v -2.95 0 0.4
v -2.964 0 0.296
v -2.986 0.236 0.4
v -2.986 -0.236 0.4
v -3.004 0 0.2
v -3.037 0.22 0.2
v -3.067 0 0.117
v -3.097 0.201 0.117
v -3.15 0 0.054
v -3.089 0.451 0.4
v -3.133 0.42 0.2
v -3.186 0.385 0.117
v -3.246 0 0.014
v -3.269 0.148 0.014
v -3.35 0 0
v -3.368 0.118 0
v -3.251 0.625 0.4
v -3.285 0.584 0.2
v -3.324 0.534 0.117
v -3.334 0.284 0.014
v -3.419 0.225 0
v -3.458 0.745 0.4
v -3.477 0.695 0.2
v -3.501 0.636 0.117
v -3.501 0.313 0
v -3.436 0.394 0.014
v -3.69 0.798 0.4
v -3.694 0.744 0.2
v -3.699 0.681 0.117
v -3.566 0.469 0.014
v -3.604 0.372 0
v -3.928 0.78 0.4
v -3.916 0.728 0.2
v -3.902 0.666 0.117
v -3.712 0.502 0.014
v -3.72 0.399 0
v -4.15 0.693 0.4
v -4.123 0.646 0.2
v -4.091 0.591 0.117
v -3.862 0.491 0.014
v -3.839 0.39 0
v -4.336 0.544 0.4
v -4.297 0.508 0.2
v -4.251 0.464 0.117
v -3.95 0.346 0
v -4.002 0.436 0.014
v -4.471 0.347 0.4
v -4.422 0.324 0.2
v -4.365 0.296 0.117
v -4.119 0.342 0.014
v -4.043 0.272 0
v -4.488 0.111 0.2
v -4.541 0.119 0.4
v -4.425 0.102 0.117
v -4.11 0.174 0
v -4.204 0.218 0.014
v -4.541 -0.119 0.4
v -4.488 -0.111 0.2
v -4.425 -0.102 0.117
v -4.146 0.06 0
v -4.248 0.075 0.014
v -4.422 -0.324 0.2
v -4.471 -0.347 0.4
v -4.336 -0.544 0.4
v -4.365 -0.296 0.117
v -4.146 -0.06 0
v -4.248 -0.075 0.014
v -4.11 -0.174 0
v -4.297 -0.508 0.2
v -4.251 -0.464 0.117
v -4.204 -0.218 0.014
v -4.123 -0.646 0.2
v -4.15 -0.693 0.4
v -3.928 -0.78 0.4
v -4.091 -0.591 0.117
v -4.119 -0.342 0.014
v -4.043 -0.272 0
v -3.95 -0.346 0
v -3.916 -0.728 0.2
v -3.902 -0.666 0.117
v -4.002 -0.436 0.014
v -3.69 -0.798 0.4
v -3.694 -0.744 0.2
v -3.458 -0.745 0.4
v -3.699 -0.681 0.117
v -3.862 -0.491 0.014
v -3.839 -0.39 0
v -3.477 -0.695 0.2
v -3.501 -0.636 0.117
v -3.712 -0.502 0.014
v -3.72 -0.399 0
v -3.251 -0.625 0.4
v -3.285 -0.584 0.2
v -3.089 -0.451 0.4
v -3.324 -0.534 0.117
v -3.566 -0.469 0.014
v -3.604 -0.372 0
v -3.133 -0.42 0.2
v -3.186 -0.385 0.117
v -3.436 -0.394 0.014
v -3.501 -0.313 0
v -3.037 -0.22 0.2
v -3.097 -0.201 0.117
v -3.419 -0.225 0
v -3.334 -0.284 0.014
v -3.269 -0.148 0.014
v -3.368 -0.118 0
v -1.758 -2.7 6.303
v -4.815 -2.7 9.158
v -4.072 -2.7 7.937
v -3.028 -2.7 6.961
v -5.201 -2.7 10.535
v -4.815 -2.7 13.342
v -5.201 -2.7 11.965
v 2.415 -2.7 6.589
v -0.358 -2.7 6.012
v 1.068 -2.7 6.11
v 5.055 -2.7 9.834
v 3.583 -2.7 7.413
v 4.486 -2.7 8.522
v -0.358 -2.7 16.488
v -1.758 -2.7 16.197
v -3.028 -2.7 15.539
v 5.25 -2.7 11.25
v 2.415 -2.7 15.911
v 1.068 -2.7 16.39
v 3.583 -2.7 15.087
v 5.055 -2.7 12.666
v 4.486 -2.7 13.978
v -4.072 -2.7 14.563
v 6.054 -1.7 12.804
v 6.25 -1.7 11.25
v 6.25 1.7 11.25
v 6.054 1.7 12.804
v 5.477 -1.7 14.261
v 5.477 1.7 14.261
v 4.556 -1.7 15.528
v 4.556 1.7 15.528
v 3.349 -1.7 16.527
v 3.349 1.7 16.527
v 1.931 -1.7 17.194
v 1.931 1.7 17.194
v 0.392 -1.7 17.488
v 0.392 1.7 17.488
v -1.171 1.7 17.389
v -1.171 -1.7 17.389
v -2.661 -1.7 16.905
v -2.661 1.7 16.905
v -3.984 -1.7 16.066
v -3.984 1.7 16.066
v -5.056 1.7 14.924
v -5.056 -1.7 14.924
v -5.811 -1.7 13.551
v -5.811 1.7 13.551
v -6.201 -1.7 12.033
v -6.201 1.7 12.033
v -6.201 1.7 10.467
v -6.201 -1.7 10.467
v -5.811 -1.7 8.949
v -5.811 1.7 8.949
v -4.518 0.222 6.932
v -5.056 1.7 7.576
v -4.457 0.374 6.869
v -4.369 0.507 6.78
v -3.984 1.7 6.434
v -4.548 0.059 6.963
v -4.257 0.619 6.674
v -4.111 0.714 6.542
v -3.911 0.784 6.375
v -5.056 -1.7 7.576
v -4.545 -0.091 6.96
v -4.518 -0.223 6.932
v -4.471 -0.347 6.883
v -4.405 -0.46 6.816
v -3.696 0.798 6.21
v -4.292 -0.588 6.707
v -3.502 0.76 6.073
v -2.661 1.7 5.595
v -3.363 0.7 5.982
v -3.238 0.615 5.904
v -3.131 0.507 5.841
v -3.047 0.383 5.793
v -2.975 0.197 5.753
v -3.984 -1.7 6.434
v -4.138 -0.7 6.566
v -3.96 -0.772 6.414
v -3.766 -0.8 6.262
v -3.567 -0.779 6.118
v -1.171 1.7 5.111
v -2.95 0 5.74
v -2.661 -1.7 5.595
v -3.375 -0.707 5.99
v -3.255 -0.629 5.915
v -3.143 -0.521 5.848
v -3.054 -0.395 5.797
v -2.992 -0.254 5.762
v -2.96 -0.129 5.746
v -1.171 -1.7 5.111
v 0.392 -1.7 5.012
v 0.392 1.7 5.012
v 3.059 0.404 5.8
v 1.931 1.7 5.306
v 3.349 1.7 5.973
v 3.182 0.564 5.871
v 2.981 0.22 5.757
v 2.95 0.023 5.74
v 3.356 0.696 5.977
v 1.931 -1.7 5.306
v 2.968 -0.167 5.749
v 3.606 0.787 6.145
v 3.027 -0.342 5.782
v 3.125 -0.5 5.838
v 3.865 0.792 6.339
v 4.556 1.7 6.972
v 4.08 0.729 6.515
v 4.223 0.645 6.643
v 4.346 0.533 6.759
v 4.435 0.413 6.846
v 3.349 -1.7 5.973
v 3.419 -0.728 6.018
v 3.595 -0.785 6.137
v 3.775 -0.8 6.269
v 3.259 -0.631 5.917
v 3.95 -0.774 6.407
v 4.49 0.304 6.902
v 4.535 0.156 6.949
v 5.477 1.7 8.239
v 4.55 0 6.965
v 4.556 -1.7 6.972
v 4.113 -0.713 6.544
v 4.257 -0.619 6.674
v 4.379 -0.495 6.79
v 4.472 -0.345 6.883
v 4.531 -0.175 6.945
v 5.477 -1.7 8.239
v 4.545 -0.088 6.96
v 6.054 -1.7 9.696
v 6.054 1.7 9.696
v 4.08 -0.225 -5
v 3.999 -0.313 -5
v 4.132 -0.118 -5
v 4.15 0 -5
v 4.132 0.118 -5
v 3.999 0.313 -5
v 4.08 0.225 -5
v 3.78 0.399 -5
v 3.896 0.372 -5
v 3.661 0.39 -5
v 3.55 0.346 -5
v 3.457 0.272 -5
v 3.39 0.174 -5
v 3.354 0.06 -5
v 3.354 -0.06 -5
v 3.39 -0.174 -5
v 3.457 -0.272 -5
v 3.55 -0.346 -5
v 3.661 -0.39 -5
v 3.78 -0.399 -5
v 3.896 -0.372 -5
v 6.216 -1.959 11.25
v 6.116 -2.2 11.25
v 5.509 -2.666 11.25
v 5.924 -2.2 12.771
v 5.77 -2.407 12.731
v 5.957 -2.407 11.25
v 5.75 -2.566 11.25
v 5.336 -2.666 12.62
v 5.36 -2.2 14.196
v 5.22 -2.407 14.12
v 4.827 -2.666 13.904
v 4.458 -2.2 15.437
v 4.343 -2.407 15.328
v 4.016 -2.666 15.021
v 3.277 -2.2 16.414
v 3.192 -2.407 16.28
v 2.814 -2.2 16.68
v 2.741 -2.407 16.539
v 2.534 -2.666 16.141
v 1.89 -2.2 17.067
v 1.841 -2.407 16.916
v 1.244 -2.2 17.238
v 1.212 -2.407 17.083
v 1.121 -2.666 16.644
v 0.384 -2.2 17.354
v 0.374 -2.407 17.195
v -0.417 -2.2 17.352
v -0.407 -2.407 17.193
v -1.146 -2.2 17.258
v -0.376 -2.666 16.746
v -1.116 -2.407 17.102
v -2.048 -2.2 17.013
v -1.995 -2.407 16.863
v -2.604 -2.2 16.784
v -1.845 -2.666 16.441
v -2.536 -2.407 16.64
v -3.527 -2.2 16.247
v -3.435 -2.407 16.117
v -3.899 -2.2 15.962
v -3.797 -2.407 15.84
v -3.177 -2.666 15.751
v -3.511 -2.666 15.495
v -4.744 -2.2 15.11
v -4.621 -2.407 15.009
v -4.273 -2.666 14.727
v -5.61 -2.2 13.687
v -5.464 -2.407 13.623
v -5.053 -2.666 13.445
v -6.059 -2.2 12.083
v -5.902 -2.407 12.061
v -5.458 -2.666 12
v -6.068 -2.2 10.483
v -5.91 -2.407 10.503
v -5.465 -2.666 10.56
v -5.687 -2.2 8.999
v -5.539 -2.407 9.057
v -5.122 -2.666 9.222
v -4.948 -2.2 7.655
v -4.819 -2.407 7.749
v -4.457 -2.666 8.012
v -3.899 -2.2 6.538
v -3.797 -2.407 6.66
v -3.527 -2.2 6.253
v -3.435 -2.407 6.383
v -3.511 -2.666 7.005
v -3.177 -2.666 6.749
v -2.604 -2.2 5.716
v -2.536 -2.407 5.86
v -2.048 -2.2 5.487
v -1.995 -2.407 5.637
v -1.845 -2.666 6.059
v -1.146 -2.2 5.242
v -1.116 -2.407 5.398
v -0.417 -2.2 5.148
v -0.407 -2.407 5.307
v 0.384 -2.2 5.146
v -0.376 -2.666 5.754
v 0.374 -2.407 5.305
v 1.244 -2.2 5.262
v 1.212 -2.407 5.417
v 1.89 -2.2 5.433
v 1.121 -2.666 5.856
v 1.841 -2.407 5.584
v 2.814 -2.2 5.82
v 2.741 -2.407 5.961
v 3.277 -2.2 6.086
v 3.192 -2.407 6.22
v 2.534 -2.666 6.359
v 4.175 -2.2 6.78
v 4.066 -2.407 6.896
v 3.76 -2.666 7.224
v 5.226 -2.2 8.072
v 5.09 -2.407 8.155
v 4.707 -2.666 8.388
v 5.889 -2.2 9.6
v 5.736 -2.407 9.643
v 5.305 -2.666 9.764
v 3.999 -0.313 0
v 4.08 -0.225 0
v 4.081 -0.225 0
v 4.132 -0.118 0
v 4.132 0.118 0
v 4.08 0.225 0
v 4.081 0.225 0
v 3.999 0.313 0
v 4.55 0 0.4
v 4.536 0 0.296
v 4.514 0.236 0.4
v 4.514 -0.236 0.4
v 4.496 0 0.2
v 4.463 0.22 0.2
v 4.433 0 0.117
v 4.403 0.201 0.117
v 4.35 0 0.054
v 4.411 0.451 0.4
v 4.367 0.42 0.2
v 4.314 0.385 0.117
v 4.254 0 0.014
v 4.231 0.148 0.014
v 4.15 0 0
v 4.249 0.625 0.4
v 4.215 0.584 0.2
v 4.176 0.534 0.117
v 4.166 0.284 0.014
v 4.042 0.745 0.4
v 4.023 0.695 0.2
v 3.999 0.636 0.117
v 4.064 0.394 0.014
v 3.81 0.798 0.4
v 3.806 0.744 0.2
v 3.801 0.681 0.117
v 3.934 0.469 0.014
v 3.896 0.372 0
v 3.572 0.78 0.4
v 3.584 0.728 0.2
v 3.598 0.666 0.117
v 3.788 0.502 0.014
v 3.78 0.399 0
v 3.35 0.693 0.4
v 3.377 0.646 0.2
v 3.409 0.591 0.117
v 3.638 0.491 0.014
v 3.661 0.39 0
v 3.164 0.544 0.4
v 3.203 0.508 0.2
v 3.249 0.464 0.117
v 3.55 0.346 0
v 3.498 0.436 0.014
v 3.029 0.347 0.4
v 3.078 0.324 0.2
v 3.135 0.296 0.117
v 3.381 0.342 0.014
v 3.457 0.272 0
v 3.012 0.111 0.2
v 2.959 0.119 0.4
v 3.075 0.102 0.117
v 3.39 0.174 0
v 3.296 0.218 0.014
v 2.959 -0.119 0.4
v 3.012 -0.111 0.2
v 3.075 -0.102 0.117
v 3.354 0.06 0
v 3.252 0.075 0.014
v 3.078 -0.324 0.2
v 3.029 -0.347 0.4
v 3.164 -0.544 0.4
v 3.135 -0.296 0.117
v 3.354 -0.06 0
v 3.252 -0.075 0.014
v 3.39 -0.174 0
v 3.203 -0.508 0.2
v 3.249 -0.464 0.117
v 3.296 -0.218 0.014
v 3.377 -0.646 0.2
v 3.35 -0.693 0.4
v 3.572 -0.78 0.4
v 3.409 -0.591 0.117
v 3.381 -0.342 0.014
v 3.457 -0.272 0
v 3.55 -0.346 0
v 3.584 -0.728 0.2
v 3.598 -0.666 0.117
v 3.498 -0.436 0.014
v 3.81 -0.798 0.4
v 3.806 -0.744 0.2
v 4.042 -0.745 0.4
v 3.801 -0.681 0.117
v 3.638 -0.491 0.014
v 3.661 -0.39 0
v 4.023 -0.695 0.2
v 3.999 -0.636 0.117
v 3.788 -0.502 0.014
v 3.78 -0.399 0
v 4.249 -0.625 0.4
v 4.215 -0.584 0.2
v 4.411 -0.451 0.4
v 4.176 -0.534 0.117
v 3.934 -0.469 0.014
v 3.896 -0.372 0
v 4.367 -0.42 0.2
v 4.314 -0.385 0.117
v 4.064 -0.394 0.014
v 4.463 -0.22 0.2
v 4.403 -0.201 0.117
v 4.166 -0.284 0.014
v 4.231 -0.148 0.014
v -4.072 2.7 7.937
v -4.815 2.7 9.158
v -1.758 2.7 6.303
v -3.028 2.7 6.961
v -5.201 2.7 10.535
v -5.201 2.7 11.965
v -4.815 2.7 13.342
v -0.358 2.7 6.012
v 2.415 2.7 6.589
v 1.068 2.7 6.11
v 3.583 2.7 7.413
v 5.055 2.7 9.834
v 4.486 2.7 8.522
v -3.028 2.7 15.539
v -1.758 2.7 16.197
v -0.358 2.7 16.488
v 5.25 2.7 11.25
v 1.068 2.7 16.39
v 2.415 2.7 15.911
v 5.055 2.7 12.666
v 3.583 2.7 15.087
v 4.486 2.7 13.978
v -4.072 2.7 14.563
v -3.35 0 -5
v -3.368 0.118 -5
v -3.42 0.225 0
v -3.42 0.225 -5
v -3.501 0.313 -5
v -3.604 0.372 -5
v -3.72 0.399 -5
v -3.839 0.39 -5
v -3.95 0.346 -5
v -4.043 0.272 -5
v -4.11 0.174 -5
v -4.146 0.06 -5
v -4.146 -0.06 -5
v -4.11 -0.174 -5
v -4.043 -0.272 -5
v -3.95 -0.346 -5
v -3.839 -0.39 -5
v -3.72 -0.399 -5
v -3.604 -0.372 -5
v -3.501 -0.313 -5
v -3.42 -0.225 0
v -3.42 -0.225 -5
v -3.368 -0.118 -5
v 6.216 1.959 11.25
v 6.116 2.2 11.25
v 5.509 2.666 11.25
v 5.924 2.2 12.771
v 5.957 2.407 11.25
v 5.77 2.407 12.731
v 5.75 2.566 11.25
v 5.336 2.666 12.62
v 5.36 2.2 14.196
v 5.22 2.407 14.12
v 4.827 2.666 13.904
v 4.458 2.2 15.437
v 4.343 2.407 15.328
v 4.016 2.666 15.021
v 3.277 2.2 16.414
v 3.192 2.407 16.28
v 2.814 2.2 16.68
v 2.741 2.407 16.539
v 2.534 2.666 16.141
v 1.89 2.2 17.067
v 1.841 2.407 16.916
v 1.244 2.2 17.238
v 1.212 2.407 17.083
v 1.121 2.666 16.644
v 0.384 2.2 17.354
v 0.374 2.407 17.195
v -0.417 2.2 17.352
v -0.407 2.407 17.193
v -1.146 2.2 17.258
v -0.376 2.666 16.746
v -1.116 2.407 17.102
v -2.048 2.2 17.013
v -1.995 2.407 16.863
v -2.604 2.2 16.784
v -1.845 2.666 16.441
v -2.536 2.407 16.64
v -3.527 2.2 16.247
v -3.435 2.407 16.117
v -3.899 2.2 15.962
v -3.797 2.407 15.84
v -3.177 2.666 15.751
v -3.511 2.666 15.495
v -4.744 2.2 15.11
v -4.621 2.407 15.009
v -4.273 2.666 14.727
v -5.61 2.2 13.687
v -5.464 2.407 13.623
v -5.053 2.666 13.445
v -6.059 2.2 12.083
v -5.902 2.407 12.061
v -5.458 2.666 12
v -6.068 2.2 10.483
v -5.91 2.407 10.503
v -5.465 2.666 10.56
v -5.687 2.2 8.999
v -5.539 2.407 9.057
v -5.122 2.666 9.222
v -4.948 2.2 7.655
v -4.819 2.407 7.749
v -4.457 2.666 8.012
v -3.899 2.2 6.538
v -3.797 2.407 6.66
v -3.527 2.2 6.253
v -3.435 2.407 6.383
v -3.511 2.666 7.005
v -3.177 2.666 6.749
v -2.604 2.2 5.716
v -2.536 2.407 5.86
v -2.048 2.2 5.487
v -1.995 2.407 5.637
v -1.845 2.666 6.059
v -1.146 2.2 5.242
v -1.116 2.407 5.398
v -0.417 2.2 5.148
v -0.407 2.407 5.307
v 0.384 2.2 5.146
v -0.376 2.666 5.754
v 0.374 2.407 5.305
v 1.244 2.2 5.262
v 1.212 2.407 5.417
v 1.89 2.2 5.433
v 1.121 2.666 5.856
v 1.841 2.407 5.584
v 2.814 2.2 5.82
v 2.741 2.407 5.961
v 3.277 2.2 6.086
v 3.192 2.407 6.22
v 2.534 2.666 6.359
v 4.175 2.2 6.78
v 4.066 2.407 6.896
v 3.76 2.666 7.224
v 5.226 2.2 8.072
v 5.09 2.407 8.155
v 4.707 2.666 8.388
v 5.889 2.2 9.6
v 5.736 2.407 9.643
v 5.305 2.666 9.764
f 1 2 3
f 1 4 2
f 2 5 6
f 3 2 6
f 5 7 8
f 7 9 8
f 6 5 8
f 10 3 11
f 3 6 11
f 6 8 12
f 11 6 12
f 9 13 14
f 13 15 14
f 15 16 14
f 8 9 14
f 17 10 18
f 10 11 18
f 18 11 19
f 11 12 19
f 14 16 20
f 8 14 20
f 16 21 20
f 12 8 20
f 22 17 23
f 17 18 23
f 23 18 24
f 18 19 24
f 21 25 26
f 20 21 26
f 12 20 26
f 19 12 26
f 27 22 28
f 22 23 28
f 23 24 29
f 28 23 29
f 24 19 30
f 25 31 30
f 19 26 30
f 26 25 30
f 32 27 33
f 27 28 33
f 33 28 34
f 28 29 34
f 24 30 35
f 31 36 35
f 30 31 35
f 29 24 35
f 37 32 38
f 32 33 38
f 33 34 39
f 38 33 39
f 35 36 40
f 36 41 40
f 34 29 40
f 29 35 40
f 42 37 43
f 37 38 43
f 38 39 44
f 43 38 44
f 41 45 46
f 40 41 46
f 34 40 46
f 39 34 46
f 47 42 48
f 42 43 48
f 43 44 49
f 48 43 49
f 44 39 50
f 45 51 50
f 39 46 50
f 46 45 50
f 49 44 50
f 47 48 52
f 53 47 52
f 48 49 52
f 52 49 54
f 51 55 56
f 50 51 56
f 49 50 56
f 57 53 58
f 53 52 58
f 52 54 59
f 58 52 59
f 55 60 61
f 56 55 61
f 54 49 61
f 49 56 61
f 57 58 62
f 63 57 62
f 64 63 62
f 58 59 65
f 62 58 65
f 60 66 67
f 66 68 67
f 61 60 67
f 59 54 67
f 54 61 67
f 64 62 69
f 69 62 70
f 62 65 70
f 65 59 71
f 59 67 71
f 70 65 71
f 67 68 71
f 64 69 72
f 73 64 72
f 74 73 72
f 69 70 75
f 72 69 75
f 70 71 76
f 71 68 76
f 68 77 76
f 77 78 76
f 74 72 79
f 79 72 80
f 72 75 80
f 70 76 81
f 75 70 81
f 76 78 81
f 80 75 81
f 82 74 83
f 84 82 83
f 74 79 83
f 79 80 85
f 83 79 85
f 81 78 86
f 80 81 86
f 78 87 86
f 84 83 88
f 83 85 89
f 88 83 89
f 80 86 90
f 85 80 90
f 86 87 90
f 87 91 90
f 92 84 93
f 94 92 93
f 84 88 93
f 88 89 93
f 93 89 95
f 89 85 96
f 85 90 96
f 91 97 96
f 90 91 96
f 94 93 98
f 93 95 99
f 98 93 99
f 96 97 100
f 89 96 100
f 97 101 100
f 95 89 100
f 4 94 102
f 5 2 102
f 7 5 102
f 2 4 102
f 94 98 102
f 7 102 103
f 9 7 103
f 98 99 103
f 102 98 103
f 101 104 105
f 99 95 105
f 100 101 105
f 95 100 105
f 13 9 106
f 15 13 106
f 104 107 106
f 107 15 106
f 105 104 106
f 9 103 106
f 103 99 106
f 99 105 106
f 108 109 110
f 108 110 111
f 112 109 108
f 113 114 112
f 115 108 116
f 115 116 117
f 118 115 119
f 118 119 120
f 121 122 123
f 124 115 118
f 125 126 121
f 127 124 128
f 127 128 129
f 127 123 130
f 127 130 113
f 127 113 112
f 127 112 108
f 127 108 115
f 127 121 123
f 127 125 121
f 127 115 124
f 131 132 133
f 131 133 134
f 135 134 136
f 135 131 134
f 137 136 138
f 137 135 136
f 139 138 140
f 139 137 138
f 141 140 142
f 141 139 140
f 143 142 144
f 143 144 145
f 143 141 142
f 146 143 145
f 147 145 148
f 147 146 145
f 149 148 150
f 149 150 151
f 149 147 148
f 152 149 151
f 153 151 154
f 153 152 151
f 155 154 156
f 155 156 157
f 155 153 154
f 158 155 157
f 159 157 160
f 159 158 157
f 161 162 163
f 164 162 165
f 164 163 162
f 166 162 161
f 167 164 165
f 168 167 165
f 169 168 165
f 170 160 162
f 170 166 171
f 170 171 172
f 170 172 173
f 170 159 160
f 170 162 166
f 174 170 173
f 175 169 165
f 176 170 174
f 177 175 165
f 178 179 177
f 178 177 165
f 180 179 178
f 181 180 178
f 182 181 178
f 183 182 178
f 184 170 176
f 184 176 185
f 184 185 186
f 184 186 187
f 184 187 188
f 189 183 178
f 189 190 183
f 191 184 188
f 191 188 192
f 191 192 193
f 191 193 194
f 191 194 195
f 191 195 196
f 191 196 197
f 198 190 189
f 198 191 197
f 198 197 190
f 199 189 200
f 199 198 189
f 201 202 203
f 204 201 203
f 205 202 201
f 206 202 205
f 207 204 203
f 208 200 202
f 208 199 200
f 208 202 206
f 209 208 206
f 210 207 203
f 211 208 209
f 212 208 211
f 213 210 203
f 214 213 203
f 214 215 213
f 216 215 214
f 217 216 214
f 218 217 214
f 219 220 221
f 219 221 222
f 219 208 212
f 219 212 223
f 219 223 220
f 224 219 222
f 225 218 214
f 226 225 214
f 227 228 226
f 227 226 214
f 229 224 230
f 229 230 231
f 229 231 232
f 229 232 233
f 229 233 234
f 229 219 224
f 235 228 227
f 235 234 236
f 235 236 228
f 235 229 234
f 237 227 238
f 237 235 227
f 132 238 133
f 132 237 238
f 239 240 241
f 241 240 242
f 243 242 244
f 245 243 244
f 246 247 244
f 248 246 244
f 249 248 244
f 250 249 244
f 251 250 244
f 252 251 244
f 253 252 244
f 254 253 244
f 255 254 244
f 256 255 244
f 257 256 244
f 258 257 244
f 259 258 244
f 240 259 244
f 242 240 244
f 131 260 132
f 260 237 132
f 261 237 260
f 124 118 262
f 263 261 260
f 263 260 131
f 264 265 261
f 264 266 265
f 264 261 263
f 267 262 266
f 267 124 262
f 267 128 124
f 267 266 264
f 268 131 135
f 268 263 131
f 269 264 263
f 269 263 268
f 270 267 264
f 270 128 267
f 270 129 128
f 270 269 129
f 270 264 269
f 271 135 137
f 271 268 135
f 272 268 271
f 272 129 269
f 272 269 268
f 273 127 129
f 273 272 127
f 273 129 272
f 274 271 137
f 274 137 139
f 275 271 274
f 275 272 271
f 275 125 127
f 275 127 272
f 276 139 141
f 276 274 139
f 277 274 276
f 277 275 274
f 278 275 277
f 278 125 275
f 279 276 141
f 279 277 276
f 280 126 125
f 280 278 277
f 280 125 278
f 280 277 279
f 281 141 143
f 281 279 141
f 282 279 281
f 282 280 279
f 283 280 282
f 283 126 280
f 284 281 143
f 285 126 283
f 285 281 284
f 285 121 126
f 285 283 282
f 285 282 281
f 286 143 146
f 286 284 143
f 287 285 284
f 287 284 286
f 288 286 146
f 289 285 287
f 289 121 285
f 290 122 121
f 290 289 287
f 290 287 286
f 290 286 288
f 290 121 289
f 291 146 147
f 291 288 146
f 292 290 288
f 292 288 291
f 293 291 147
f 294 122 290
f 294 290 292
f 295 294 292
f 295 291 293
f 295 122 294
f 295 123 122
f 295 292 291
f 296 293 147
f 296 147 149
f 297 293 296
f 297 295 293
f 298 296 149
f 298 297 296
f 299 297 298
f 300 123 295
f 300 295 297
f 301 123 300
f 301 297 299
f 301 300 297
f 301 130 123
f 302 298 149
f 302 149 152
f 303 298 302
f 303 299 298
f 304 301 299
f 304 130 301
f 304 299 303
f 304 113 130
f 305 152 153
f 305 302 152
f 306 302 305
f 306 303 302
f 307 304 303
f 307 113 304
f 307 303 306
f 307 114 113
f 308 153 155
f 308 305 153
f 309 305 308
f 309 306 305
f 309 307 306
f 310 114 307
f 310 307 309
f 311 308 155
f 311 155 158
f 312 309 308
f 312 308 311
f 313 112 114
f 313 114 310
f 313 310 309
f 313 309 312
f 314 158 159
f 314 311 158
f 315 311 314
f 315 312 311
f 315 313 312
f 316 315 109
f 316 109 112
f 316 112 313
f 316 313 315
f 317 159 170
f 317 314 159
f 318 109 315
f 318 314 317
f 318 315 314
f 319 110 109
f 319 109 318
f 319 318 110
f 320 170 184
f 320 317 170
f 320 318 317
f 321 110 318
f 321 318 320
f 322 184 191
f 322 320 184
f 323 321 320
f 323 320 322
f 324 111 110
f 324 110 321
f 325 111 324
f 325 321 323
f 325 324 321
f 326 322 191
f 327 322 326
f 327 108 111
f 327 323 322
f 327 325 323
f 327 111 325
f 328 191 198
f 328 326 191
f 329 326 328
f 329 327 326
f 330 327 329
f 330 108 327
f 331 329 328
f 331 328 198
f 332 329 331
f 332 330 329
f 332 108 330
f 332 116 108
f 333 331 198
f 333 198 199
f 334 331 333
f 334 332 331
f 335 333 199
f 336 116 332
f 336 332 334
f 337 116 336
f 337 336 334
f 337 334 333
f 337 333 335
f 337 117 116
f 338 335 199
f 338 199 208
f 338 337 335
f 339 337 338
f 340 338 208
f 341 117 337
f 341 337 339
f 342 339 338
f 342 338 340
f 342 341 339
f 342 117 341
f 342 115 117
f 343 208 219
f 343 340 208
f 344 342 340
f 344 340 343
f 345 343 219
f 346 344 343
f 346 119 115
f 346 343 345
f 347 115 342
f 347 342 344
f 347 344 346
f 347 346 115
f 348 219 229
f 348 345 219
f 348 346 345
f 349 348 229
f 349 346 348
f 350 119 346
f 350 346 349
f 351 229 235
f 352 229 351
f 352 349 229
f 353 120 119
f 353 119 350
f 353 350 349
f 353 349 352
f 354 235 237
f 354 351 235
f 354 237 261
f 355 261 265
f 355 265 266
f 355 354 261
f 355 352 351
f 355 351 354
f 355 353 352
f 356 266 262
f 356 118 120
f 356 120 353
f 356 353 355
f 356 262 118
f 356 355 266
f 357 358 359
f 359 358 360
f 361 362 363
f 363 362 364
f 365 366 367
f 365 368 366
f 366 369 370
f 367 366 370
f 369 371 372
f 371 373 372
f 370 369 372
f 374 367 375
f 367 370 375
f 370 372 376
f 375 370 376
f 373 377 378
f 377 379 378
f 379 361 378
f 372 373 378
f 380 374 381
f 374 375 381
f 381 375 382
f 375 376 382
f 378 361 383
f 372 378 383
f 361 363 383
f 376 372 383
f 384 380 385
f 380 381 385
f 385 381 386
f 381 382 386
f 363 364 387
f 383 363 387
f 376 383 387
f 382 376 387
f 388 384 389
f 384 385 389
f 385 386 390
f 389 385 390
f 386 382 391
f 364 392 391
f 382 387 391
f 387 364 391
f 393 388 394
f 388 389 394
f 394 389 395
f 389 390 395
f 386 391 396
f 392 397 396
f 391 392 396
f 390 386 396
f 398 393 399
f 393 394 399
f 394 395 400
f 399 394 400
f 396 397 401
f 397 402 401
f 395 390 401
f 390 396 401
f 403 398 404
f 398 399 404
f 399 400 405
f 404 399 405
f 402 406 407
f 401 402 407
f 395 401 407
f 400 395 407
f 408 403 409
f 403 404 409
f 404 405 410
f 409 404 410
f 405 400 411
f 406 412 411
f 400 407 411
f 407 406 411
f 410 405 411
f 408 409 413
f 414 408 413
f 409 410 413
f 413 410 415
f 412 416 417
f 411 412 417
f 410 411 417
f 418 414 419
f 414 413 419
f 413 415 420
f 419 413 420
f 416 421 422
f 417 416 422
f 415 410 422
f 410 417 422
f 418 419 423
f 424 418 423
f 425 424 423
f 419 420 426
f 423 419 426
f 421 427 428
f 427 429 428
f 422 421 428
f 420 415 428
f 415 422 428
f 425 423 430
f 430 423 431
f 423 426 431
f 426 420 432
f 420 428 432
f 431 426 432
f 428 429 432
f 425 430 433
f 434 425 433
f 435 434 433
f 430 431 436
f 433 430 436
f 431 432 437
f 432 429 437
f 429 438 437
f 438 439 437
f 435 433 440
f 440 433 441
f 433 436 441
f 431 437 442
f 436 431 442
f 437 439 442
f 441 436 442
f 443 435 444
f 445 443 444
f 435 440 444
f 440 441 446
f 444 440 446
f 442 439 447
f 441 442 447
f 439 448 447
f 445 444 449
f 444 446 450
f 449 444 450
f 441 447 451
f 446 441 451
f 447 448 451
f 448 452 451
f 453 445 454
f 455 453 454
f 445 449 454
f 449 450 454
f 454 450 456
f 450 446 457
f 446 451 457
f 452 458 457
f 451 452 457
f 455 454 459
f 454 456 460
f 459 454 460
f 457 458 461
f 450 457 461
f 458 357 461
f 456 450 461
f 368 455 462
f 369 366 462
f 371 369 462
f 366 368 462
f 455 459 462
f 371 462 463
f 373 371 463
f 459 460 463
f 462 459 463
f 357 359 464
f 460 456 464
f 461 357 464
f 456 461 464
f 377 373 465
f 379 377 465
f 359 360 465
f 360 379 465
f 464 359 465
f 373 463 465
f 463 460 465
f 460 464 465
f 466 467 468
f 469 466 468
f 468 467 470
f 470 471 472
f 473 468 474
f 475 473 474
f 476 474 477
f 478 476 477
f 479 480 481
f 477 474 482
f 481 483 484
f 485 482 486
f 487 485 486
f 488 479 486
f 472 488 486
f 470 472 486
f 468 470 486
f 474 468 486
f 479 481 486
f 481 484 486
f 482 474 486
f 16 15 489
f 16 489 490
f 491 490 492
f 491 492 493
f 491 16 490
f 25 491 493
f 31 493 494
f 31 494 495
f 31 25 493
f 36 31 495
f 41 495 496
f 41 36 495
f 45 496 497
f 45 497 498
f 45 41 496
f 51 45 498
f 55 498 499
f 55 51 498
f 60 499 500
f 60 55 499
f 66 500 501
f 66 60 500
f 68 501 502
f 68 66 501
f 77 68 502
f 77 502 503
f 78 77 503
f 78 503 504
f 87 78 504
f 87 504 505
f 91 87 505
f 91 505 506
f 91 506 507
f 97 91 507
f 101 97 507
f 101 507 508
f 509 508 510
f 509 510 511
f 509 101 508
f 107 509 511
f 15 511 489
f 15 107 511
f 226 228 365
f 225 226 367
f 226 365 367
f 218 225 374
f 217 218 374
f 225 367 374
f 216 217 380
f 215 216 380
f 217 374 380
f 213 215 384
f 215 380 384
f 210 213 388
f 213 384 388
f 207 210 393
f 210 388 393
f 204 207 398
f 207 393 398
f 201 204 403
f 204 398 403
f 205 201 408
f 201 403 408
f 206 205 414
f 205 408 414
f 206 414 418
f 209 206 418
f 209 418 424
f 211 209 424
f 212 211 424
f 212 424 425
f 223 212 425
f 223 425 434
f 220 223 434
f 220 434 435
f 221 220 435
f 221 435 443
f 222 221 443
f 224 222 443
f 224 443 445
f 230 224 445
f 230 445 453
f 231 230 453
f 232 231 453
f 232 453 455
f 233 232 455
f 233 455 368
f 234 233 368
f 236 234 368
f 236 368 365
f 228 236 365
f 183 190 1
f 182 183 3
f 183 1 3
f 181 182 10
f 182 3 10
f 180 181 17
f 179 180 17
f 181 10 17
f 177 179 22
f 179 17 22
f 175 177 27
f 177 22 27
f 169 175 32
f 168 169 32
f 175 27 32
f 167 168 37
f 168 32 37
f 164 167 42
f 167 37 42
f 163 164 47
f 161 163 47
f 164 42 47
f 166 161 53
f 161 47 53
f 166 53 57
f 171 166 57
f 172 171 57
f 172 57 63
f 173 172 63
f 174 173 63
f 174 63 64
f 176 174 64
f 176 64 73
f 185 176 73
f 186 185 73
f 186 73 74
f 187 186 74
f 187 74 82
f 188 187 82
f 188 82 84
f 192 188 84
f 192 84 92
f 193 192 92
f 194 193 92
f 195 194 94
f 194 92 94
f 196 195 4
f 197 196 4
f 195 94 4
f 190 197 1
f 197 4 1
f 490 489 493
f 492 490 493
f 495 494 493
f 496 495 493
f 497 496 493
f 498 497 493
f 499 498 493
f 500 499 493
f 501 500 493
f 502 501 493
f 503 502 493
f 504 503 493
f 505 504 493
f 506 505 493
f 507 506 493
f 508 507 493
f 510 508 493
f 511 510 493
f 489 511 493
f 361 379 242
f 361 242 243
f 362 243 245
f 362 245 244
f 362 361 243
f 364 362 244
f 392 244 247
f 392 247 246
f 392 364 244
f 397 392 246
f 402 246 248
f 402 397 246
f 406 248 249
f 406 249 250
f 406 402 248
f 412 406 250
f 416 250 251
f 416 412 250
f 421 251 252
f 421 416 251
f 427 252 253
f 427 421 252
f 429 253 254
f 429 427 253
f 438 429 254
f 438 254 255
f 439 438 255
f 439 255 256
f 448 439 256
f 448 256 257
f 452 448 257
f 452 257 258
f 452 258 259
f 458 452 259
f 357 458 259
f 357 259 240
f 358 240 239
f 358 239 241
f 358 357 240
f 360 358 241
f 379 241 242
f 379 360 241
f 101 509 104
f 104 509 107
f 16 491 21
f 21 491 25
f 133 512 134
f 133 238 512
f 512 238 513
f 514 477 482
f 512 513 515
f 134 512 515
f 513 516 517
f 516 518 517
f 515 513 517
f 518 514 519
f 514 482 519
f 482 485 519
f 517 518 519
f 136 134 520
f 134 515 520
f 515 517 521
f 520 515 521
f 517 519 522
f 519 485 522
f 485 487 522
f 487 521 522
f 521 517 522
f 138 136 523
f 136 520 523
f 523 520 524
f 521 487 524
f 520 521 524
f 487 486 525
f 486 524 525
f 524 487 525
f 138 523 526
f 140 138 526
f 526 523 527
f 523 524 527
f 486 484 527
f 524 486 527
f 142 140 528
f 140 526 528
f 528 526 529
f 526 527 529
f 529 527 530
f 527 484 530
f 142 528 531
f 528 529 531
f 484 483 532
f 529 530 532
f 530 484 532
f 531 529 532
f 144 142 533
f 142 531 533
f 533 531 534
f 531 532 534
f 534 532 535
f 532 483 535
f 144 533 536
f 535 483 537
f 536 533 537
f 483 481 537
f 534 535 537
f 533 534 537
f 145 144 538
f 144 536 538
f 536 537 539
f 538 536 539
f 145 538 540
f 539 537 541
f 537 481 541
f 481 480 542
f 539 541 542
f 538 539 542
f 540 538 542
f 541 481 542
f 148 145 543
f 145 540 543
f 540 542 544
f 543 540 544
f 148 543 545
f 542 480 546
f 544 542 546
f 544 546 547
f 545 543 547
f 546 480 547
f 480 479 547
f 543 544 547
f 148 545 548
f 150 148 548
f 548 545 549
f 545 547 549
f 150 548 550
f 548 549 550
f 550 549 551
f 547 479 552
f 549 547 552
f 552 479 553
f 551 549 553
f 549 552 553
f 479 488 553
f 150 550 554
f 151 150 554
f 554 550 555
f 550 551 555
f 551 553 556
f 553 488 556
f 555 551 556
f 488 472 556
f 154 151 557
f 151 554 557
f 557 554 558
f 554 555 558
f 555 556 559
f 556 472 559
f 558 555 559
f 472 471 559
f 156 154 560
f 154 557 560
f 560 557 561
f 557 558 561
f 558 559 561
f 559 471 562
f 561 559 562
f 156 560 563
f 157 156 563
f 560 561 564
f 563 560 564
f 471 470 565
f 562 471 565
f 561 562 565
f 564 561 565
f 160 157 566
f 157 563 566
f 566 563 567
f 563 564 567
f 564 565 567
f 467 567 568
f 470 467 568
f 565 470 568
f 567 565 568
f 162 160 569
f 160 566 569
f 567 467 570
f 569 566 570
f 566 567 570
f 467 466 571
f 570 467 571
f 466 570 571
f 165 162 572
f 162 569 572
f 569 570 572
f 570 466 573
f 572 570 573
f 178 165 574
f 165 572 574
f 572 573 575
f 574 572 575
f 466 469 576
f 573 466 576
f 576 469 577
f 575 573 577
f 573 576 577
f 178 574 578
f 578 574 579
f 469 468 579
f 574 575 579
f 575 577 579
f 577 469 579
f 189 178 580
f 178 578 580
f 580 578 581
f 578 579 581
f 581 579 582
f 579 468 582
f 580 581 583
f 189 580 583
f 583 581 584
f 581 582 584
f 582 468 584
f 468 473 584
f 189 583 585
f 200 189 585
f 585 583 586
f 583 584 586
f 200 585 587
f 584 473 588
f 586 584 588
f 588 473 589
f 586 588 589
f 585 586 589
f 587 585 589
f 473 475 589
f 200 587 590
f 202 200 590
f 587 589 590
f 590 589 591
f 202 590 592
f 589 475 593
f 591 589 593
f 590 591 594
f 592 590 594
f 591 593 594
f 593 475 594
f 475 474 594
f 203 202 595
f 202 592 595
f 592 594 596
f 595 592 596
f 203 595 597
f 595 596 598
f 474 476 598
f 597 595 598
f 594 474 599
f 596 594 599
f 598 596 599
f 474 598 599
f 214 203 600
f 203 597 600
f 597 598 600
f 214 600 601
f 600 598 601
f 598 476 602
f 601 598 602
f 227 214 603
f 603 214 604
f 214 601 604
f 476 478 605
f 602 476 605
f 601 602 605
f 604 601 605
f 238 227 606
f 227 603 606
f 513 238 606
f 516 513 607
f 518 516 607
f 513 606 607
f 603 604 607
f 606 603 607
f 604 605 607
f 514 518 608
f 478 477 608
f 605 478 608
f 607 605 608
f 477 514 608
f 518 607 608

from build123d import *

# Parameters (mm, degrees)
F0_R     = 6.25
F1_DEPTH = 2.7
F2_R     = 0.8
F2_R_2   = 0.4
F4_DEPTH = 5
F5_R     = 0.39999
F6_R     = 1


# Not quite as in the source:
# - a fillet or chamfer is up to 0.001 mm smaller than in the source, because OpenCascade refuses the exact size
# - a feature names something its author has since deleted; it is built from what else it names


with BuildPart() as f1:
    # F0 (on Front) → F1 (new body, symmetric)
    with BuildSketch(Plane.XZ):
        with Locations((0, 11.25)):
            Circle(F0_R)
    extrude(amount=F1_DEPTH, both=True)

    # F2 (on Top) → F3 (join, up to the next surface of F1)
    with BuildSketch(Plane.XY):
        with Locations((-3.75, 0)):
            Circle(F2_R)
        with Locations((-3.75, 0)):
            Circle(F2_R_2, mode=Mode.SUBTRACT)
        with Locations((3.75, 0)):
            Circle(F2_R)
        with Locations((3.75, 0)):
            Circle(F2_R_2, mode=Mode.SUBTRACT)
        with Locations((-3.75, 0)):
            Circle(F2_R_2)
        with Locations((3.75, 0)):
            Circle(F2_R_2)
    extrude(until=Until.NEXT)

    # F2 (on Top) → F4 (join)
    with BuildSketch(Plane.XY):
        with Locations((-3.75, 0)):
            Circle(F2_R_2)
        with Locations((3.75, 0)):
            Circle(F2_R_2)
    extrude(amount=-F4_DEPTH)

    # F5 (radius 0.4 in the source; OpenCascade refuses exactly that, so slightly less here)
    f5_edges = [f1.edges().sort_by_distance(p)[0] for p in [
        (-4.55, 0, 0),
        (2.95, 0, 0),
    ]]
    fillet(f5_edges, radius=F5_R)

    # F6
    f6_edges = [f1.edges().sort_by_distance(p)[0] for p in [
        (-6.25, -2.7, 11.25),
        (-6.25, 2.7, 11.25),
    ]]
    fillet(f6_edges, radius=F6_R)


solid = f1.part
